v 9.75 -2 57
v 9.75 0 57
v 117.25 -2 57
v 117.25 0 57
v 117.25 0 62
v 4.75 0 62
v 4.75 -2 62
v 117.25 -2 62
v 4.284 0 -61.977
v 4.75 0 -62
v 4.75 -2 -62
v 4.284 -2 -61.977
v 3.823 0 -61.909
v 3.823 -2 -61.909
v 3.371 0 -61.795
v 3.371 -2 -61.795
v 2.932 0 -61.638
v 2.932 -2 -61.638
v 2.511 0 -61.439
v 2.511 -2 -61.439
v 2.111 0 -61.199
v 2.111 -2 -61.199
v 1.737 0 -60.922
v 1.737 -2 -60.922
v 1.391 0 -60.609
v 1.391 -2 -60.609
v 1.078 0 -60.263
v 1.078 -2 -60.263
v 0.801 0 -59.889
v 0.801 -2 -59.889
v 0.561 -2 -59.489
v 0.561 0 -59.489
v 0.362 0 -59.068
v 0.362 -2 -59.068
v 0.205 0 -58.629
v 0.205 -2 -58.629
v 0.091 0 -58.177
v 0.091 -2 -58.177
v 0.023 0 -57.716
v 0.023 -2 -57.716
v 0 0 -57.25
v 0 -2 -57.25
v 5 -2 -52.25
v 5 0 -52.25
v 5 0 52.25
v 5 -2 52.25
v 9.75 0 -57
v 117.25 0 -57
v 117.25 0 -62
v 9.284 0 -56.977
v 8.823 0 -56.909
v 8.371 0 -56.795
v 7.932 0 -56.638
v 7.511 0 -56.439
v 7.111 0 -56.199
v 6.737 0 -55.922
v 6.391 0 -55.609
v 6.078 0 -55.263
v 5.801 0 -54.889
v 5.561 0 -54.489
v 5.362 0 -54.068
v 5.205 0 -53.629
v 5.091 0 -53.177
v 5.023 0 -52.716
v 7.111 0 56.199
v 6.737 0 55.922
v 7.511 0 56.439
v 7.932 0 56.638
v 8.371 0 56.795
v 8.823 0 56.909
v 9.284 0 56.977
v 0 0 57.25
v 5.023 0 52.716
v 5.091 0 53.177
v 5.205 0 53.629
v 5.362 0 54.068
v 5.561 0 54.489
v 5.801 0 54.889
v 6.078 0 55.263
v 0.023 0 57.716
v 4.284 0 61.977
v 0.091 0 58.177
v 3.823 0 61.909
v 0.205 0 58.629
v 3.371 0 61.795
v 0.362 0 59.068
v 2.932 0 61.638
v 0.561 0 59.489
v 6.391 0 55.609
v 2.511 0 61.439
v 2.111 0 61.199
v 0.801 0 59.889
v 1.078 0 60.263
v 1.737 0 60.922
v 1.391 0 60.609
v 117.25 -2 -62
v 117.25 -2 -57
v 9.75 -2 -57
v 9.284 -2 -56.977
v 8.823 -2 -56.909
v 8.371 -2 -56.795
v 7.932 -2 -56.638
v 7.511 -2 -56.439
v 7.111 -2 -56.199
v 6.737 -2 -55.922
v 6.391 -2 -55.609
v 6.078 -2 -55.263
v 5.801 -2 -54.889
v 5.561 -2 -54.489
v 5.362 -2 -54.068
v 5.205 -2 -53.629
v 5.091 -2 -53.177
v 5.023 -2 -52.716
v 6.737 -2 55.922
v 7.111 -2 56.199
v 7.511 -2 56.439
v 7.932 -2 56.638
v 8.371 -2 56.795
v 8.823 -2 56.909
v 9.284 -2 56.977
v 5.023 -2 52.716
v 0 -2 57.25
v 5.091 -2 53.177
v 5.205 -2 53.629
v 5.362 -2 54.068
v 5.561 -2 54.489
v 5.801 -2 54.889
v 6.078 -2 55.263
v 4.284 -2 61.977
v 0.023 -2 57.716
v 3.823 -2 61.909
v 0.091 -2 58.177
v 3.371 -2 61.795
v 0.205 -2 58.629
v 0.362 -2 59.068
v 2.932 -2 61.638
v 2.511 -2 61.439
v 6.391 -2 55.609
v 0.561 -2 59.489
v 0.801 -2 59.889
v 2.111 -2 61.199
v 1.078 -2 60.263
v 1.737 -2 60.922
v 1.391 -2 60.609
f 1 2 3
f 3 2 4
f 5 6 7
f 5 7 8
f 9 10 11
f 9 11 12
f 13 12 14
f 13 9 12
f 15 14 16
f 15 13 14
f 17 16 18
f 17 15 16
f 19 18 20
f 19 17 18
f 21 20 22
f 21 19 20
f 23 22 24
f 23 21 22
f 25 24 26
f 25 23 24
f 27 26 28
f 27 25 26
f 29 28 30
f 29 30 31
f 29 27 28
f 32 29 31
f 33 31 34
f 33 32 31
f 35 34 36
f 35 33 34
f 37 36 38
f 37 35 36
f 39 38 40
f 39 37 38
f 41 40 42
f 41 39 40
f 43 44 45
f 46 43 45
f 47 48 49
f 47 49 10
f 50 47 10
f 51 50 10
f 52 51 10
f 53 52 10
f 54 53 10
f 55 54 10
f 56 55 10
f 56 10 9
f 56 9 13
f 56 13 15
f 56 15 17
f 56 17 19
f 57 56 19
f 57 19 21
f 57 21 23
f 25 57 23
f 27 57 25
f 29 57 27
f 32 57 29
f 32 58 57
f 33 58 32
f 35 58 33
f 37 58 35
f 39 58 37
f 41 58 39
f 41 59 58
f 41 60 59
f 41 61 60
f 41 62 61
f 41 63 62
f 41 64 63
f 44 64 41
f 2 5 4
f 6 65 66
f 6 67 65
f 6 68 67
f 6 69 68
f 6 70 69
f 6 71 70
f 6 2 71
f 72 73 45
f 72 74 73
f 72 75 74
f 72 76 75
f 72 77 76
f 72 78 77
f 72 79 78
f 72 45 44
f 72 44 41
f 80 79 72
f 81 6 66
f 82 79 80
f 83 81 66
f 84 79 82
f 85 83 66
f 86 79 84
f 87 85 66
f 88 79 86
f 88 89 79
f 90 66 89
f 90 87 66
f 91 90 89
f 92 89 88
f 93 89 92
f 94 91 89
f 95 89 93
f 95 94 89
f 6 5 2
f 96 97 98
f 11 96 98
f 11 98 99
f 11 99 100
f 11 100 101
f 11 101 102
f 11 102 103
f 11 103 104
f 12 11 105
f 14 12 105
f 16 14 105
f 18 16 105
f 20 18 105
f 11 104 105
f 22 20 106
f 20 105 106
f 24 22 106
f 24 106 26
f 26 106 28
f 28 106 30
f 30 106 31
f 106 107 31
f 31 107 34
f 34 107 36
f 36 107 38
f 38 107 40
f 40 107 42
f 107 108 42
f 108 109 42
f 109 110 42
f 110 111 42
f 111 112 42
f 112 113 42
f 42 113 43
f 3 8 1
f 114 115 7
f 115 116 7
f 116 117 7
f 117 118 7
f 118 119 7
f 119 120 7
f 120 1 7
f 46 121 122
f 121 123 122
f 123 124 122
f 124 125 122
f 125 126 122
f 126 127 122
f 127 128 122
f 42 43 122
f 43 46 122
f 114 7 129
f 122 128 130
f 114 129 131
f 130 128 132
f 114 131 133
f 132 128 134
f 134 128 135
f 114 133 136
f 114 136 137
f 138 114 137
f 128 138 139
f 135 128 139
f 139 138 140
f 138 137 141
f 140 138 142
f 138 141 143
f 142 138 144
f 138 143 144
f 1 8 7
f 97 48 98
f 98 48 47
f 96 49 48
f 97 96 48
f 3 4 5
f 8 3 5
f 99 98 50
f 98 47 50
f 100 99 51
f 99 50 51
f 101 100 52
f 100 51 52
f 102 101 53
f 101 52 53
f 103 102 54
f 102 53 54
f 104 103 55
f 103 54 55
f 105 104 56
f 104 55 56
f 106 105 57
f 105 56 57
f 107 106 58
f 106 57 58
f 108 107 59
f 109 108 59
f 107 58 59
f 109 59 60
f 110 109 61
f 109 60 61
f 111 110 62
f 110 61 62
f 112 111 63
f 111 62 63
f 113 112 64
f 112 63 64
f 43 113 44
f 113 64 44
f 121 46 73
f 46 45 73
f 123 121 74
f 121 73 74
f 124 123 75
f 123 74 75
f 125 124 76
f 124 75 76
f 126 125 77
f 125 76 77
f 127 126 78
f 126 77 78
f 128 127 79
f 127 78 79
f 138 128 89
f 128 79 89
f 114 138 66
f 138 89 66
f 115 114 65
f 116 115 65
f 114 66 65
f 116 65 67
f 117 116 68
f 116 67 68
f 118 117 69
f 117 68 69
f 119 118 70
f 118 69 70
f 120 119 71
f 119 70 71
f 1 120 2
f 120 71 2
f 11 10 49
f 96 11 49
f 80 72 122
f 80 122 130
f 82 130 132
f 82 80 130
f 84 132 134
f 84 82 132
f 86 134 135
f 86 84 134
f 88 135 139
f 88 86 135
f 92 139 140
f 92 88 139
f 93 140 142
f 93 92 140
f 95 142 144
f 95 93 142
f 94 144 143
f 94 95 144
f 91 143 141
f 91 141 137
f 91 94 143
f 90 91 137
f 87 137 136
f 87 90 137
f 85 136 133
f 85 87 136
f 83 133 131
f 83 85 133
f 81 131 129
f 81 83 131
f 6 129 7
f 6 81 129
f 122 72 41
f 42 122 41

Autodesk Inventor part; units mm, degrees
ref_plane "YZ Plane" through (0, 0, 0) normal (1, 0, 0) x (0, 1, 0)
ref_plane "XZ Plane" through (0, 0, 0) normal (0, 1, 0) x (-1, 0, 0)
ref_plane "XY Plane" through (0, 0, 0) normal (0, 0, 1) x (1, 0, 0)
sketch "Sketch1" plane through (0, 0, 0) normal (0, 1, 0) x (-1, 0, 0)
  line L0 (0, 62) -> (0, 57.25) construction
  line L1 (0, 62) -> (-4.75, 62) construction
  line L2 (0, -62) -> (-4.75, -62) construction
  line L3 (-117.25, -57) -> (-9.75, -57)
  line L4 (-5, -57) -> (-5, -52.25) construction
  line L5 (-5, 57) -> (-9.75, 57) construction
  line L6 (-117.25, 57) -> (-117.25, 62)
  line L7 (-117.25, -62) -> (-117.25, -57)
  arc A0 (-5, 52.25) -> (-9.75, 57) centre (-9.75, 52.25) ccw
  arc A1 (-9.75, -57) -> (-5, -52.25) centre (-9.75, -52.25) ccw
  arc A2 (0, 57.25) -> (-4.75, 62) centre (-4.75, 57.25) ccw
  arc A3 (-4.75, -62) -> (0, -57.25) centre (-4.75, -57.25) ccw
  line L8 (0, 57.25) -> (0, -57.25)
  line L9 (-4.75, 62) -> (-117.25, 62)
  line L10 (0, -57.25) -> (0, -62) construction
  line L11 (-4.75, -62) -> (-117.25, -62)
  line L12 (-5, -52.25) -> (-5, 52.25)
  line L13 (-9.75, -57) -> (-5, -57) construction
  line L14 (-5, 52.25) -> (-5, 57) construction
  line L15 (-9.75, 57) -> (-117.25, 57)
  arc A4 (-4.75, 62) -> (0, 57.25) centre (-4.75, 57.25) ccw construction
  arc A5 (-9.75, 57) -> (-5, 52.25) centre (-9.75, 52.25) ccw construction
  arc A6 (0, -57.25) -> (-4.75, -62) centre (-4.75, -57.25) ccw construction
  arc A7 (-5, -52.25) -> (-9.75, -57) centre (-9.75, -52.25) ccw construction
  point P0 (0, 0)
  point P1 (0, 0)
  dimension "d4" = 5
  dimension "d6" = 117.25
  dimension "d8" = 117.25
  dimension "d9" = 5
  dimension "d10" = 5
  dimension "d11" = 124
  dimension "d12" = 57
  dimension "d14" = 9.5
extrude "Plate1" add sketch "Sketch1" against normal blind 2
equation "\"d8\" = d6"
equation "\"d9\" = d4"
equation "\"d10\" = d4"
equation "\"d11\" = Ширина_крепления_корпуса + 2 * Thickness"
equation "\"d5\" = Thickness"
equation "\"BendReliefWidth\" = Thickness"
equation "\"BendReliefDepth\" = 0.5 * Thickness"
equation "\"CornerReliefSize\" = 4 * Thickness"
equation "\"MinimumRemnant\" = 2 * Thickness"
equation "\"TransitionRadius\" = BendRadius"
equation "\"JacobiRadiusSize\" = BendRadius"
equation "\"GapSize\" = Thickness"
equation "\"Ширина_крепления_корпуса\" = 120"
equation "\"Thickness\" = 2"
equation "\"BendRadius\" = 2.75"
properties part number "Опоры на кожухе" material "Stainless Steel"
